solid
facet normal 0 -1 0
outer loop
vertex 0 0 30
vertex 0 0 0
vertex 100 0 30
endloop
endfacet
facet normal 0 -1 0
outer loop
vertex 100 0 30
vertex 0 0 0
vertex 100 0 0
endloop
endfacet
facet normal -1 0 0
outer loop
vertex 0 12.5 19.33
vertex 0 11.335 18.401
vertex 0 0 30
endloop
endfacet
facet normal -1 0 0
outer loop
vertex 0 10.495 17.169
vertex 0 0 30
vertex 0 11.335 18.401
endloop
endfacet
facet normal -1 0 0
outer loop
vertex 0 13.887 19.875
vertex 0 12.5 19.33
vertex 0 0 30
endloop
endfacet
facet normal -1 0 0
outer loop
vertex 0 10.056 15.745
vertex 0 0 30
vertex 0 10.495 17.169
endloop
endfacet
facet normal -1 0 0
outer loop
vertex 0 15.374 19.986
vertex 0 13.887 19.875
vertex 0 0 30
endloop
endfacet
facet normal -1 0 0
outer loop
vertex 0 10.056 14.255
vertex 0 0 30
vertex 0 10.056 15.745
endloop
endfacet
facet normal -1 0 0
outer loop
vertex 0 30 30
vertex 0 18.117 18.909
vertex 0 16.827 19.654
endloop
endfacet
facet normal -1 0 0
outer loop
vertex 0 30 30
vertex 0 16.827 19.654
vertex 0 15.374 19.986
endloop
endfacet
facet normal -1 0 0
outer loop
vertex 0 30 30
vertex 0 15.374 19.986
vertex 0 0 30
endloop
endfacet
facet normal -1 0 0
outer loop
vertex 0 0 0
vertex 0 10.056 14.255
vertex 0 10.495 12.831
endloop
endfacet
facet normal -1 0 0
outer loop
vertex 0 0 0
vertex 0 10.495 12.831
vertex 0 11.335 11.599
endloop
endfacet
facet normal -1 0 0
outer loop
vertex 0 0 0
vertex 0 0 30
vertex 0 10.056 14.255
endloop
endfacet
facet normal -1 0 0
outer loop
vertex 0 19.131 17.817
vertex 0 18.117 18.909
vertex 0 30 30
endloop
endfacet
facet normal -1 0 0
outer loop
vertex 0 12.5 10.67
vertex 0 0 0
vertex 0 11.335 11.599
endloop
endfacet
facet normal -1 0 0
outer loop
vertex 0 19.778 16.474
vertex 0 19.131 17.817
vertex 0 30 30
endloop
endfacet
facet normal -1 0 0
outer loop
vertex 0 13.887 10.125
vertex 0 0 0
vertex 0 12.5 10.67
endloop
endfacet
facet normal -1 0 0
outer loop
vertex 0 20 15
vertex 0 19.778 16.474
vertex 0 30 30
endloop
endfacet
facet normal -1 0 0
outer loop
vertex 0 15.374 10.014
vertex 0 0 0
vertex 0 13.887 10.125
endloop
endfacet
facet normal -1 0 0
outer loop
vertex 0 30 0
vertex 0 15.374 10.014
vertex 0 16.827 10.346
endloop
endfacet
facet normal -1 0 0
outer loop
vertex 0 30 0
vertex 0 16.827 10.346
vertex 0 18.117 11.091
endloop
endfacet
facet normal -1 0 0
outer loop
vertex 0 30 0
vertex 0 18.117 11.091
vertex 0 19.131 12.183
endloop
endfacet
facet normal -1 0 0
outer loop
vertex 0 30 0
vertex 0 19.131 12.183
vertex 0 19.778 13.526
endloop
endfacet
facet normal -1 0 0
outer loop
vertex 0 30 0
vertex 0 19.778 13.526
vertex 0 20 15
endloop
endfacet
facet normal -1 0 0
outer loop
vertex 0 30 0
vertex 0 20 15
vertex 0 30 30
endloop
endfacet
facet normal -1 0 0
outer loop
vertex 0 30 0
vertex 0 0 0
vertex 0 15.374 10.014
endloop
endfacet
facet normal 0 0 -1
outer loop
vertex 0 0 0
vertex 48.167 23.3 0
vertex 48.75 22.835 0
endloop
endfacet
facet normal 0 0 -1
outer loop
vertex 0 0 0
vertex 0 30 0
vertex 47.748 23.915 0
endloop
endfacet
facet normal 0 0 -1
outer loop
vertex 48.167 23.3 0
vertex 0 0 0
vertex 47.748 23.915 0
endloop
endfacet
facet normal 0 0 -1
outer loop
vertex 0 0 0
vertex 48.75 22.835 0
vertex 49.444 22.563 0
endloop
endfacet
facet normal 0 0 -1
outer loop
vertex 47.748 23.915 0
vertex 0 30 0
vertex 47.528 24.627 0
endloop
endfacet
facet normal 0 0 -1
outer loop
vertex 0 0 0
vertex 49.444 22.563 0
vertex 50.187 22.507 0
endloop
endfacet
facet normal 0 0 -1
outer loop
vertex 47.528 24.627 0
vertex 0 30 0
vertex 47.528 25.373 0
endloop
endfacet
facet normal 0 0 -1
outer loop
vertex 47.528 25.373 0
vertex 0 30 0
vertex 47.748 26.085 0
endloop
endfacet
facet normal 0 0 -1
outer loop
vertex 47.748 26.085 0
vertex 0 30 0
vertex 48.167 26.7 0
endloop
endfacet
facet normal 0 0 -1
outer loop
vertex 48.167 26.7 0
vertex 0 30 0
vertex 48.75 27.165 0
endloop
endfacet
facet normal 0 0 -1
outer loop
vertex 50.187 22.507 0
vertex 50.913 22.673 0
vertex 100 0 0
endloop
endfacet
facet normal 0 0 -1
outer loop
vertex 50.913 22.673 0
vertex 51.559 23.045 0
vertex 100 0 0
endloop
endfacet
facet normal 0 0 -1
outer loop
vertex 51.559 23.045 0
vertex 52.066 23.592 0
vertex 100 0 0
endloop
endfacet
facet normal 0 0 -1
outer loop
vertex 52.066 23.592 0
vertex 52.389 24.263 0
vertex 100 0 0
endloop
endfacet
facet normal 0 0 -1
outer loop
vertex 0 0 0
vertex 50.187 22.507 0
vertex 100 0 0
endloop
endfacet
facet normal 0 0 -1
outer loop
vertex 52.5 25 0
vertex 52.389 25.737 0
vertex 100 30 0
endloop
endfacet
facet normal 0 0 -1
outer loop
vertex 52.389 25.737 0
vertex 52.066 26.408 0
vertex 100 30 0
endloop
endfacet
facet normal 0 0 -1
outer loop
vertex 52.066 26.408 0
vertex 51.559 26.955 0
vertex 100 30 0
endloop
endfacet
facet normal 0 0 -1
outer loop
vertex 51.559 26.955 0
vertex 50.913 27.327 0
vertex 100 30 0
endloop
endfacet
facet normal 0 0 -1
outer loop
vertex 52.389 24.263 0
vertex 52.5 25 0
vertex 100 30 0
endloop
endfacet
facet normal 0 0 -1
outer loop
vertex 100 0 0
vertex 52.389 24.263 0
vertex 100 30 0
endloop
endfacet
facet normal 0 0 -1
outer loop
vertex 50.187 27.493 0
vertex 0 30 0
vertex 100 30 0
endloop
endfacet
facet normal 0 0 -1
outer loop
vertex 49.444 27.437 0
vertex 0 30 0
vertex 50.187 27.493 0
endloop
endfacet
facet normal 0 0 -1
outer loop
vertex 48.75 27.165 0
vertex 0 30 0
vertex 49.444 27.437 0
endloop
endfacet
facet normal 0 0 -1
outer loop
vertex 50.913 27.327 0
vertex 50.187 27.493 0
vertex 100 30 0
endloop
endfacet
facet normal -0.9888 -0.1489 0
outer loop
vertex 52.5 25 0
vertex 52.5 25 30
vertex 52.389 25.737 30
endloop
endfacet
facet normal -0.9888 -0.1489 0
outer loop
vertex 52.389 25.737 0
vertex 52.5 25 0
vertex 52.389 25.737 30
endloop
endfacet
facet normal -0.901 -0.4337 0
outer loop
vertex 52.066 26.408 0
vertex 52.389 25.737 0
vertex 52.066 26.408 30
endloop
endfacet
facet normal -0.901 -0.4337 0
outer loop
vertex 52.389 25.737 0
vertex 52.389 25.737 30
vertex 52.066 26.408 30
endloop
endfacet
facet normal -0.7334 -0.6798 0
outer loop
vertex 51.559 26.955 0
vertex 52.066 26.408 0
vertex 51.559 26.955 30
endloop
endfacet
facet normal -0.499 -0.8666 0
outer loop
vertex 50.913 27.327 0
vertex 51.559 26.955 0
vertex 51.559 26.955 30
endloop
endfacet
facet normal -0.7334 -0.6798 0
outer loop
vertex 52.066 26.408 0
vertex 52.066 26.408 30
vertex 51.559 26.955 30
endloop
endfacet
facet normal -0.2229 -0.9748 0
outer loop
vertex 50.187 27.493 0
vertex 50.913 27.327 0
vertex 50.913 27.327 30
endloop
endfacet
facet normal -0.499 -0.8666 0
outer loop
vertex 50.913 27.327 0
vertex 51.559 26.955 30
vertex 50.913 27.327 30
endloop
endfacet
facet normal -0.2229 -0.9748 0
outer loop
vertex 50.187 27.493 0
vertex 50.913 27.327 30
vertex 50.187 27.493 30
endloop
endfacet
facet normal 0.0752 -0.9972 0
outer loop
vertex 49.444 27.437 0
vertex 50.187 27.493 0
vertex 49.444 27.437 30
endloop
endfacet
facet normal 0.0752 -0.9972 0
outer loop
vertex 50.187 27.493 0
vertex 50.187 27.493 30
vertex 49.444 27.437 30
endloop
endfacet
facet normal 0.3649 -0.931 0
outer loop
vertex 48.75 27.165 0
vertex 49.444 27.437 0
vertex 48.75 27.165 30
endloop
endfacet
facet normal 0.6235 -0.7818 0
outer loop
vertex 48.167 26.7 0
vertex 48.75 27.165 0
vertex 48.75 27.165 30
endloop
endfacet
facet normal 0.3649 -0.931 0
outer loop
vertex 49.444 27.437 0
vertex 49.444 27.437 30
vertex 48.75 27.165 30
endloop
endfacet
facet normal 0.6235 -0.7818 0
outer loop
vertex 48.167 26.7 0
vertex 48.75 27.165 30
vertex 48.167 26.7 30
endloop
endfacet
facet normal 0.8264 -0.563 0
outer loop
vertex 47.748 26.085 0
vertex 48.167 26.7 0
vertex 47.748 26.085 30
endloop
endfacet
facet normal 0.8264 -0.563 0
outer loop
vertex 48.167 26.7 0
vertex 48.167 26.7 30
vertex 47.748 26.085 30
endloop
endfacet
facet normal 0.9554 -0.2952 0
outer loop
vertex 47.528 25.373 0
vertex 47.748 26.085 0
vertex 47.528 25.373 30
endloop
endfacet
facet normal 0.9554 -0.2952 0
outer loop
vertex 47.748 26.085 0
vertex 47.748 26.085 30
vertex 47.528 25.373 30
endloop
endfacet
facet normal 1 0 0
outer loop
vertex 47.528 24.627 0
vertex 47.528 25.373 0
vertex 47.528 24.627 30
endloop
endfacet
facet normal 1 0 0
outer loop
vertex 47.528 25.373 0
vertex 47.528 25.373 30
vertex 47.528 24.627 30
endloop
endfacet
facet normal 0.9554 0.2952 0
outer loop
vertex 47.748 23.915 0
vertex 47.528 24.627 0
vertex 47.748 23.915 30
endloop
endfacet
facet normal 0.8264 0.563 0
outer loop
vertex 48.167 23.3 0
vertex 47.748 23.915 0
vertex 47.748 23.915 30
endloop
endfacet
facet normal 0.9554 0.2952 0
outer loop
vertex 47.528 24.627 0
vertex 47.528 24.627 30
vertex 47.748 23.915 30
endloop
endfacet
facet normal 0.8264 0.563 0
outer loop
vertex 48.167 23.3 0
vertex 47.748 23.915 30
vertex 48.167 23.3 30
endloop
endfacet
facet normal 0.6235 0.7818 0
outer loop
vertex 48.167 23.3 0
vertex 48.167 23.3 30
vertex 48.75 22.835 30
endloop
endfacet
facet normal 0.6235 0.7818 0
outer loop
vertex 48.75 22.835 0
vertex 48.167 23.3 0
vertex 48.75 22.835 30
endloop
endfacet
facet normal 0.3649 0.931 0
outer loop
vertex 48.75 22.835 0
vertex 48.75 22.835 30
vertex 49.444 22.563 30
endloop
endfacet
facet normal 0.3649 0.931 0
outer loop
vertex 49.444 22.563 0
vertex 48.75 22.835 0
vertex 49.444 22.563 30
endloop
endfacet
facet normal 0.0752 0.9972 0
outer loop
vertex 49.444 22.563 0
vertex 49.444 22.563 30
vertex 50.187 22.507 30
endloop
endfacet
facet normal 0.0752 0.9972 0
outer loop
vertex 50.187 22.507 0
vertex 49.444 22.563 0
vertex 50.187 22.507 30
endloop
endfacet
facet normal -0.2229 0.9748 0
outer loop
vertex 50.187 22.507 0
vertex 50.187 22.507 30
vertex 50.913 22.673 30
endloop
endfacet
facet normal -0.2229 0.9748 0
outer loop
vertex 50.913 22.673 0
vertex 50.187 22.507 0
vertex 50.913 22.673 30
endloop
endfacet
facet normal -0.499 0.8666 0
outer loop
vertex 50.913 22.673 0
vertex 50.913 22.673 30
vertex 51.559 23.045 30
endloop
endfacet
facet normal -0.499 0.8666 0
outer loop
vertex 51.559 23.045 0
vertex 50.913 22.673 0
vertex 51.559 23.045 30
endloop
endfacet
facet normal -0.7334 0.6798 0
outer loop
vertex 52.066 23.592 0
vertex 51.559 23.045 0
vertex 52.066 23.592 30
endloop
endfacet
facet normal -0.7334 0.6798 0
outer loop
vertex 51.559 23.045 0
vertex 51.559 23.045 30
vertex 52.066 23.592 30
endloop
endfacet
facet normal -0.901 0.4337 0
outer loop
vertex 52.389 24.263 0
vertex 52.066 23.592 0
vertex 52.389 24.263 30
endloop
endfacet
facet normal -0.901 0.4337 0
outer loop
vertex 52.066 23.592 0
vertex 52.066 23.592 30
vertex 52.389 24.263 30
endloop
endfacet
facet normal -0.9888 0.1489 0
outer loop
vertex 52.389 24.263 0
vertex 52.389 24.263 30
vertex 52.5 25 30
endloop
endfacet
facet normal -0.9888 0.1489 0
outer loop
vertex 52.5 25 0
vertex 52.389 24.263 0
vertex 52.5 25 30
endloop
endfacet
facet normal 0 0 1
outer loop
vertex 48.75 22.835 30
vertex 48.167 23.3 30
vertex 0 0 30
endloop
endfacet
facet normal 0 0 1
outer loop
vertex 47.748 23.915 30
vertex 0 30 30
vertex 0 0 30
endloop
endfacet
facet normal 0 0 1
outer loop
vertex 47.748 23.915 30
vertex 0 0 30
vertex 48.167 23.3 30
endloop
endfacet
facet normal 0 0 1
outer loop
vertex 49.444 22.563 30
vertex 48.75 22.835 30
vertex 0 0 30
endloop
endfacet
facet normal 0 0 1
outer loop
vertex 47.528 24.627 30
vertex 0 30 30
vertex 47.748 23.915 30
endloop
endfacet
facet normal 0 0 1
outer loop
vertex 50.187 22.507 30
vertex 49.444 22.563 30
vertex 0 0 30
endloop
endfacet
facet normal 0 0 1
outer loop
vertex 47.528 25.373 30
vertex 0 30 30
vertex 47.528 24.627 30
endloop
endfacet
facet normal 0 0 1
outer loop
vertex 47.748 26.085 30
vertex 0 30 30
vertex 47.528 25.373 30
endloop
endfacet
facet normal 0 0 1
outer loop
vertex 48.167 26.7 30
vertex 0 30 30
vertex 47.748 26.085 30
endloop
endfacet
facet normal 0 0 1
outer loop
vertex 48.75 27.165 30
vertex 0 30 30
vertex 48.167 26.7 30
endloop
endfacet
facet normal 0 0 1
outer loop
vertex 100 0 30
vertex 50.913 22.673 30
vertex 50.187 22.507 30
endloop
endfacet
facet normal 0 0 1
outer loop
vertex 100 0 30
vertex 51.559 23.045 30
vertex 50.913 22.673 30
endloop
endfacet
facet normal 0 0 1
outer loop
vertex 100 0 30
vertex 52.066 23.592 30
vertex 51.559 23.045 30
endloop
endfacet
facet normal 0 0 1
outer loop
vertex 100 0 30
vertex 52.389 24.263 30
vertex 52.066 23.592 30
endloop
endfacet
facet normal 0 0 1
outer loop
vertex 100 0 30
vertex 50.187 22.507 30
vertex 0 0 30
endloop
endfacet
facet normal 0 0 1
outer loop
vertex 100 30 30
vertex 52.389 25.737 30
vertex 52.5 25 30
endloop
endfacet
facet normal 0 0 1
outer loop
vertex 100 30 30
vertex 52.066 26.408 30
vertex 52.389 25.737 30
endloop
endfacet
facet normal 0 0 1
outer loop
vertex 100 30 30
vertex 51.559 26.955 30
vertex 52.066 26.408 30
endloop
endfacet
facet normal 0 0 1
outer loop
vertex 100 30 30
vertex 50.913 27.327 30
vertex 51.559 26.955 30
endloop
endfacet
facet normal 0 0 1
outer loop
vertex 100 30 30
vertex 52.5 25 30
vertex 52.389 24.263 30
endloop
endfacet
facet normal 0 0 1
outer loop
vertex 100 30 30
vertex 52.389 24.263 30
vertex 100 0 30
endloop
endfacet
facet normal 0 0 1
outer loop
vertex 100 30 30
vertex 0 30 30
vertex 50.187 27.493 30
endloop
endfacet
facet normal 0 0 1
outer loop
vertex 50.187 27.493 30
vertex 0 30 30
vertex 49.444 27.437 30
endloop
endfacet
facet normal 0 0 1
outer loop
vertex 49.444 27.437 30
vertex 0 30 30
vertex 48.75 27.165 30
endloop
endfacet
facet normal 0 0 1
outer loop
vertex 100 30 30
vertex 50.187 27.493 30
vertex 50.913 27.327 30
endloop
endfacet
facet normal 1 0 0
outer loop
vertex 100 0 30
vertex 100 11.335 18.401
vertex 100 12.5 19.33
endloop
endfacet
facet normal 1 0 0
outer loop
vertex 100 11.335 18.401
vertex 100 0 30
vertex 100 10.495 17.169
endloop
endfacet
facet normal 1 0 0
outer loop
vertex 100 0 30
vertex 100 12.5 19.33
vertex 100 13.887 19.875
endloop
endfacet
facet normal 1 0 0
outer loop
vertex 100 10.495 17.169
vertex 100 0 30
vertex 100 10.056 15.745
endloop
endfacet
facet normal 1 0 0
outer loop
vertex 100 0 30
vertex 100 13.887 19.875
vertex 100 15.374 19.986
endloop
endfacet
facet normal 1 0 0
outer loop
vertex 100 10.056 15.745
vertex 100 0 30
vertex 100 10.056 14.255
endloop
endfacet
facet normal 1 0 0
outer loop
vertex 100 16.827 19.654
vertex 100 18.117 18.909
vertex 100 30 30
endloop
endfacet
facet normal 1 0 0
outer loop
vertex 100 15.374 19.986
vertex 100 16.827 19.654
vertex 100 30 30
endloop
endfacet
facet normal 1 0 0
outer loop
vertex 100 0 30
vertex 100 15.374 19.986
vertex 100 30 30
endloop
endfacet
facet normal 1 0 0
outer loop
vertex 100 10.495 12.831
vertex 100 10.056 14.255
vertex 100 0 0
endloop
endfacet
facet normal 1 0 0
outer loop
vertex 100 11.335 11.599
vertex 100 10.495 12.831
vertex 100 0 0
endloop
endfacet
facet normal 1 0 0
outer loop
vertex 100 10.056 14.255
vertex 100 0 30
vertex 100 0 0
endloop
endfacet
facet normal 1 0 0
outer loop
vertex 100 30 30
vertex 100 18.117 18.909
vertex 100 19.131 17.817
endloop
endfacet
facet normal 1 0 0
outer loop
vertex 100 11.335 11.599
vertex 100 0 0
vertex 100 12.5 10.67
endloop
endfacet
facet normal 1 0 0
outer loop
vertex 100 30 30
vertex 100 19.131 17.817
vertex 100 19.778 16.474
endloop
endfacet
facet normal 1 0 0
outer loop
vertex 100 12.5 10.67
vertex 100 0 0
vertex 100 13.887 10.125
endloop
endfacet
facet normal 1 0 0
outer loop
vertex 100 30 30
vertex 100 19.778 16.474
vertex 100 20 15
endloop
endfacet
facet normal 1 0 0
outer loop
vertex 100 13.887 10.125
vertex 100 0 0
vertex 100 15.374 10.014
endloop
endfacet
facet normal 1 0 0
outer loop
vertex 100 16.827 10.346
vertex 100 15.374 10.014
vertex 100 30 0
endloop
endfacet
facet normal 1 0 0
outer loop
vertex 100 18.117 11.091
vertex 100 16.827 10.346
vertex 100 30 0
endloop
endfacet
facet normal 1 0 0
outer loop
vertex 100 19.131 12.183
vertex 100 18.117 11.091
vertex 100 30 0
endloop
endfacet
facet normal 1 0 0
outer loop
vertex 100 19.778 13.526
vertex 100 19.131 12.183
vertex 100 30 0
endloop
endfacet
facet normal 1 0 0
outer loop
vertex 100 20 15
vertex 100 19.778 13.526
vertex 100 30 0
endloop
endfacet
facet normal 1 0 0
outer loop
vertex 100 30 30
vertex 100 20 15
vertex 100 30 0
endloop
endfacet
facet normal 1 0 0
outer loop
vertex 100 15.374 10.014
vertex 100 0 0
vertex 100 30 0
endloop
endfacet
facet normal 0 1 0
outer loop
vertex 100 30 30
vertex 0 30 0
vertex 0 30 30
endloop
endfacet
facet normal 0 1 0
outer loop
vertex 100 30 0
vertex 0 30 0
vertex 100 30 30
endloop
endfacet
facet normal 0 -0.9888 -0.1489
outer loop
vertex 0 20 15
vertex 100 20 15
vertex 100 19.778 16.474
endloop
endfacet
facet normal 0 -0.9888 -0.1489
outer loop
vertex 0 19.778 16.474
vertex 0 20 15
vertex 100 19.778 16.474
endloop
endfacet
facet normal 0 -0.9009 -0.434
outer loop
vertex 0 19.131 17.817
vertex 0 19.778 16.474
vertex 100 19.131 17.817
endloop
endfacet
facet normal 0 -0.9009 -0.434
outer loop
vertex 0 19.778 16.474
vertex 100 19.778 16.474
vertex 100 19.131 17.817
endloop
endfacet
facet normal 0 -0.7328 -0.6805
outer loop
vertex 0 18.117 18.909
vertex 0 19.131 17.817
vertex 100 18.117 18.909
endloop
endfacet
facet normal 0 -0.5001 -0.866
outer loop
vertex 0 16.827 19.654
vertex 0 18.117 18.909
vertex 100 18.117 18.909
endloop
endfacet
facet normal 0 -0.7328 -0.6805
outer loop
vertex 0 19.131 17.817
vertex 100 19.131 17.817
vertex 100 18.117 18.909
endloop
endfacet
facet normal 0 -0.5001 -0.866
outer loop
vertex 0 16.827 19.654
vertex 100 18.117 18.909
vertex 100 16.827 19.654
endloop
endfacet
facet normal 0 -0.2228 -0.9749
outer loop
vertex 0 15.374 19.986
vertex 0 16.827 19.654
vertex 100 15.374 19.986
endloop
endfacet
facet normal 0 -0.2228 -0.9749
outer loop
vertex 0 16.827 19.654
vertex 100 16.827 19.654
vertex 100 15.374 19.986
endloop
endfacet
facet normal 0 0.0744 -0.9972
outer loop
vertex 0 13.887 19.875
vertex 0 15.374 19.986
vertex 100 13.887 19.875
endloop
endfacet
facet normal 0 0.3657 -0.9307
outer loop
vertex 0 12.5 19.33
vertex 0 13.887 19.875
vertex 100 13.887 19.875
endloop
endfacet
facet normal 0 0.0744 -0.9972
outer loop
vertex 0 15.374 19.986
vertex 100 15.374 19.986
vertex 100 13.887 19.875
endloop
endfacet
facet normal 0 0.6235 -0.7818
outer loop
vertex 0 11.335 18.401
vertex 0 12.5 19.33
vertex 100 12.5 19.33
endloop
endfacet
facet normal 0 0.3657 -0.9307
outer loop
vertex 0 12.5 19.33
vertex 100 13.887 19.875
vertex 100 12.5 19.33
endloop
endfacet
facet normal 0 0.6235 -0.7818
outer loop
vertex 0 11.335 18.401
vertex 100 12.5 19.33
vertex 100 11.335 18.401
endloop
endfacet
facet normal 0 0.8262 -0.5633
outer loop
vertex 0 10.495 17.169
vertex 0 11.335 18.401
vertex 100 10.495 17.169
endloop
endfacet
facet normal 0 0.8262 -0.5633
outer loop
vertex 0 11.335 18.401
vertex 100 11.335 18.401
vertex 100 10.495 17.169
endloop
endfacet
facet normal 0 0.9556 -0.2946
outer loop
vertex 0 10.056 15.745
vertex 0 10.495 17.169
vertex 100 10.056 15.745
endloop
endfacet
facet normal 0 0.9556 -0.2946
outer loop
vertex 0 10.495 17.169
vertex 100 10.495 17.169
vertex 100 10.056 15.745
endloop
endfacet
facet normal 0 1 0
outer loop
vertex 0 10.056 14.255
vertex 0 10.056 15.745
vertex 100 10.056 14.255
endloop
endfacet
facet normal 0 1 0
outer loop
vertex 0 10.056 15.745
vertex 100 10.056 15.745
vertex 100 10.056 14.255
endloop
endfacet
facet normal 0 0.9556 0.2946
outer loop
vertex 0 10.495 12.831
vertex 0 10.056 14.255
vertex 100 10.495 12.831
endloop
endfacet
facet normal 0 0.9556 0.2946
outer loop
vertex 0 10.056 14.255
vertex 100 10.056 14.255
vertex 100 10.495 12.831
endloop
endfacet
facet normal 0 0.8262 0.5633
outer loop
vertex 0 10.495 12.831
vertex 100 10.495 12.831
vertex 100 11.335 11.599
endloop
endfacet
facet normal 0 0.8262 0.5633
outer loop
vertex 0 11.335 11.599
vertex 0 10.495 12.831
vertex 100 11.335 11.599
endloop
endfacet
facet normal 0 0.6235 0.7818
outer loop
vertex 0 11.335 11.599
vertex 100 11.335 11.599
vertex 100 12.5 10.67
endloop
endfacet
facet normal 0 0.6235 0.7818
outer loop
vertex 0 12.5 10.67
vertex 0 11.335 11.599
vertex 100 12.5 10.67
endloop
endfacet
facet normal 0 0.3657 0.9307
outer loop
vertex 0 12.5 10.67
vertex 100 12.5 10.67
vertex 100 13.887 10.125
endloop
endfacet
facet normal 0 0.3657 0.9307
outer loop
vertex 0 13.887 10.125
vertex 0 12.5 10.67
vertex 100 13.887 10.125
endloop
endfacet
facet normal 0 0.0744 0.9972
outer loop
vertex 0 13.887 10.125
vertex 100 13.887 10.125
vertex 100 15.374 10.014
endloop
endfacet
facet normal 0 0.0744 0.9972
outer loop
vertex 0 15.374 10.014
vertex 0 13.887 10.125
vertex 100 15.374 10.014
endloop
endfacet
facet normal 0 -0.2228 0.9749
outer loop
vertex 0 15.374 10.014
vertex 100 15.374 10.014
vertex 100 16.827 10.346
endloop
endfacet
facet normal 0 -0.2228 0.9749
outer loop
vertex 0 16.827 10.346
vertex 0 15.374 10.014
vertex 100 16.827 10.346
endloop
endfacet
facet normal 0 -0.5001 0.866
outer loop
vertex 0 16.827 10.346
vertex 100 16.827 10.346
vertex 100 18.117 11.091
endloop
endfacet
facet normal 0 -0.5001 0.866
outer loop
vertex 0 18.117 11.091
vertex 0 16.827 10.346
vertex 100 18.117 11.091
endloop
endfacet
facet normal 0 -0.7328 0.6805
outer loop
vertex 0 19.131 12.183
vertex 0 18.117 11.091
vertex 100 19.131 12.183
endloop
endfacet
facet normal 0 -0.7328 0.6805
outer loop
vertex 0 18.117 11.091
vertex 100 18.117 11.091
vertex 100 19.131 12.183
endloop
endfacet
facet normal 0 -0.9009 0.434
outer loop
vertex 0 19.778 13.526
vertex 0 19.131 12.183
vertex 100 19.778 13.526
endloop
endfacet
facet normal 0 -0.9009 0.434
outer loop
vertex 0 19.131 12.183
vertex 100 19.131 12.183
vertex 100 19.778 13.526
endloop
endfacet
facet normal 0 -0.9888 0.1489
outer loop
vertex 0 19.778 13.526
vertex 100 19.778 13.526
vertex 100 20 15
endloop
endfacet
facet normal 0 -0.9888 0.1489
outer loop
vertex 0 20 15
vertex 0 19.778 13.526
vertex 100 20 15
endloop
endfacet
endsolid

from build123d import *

# Parameters (mm, degrees)
F0_W     = 100
F0_H     = 30
F1_DEPTH = 30
F2_R     = 2.5
F3_DEPTH = 30
F4_R     = 5
F5_DEPTH = 100


with BuildPart() as f1:
    # F0 (on Top) → F1 (new body)
    with BuildSketch(Plane.XY):
        with Locations((50, 15)):
            Rectangle(F0_W, F0_H)
    extrude(amount=F1_DEPTH)

    # F2 (on face) → F3 (cut)
    with BuildSketch(Plane.XY.offset(30)):
        with Locations((50, 25)):
            Circle(F2_R)
    extrude(amount=-F3_DEPTH, mode=Mode.SUBTRACT)

    # F4 (on face) → F5 (cut)
    with BuildSketch(Plane.YZ.offset(100)):
        with Locations((15, 15)):
            Circle(F4_R)
    extrude(amount=-F5_DEPTH, mode=Mode.SUBTRACT)


solid = f1.part
